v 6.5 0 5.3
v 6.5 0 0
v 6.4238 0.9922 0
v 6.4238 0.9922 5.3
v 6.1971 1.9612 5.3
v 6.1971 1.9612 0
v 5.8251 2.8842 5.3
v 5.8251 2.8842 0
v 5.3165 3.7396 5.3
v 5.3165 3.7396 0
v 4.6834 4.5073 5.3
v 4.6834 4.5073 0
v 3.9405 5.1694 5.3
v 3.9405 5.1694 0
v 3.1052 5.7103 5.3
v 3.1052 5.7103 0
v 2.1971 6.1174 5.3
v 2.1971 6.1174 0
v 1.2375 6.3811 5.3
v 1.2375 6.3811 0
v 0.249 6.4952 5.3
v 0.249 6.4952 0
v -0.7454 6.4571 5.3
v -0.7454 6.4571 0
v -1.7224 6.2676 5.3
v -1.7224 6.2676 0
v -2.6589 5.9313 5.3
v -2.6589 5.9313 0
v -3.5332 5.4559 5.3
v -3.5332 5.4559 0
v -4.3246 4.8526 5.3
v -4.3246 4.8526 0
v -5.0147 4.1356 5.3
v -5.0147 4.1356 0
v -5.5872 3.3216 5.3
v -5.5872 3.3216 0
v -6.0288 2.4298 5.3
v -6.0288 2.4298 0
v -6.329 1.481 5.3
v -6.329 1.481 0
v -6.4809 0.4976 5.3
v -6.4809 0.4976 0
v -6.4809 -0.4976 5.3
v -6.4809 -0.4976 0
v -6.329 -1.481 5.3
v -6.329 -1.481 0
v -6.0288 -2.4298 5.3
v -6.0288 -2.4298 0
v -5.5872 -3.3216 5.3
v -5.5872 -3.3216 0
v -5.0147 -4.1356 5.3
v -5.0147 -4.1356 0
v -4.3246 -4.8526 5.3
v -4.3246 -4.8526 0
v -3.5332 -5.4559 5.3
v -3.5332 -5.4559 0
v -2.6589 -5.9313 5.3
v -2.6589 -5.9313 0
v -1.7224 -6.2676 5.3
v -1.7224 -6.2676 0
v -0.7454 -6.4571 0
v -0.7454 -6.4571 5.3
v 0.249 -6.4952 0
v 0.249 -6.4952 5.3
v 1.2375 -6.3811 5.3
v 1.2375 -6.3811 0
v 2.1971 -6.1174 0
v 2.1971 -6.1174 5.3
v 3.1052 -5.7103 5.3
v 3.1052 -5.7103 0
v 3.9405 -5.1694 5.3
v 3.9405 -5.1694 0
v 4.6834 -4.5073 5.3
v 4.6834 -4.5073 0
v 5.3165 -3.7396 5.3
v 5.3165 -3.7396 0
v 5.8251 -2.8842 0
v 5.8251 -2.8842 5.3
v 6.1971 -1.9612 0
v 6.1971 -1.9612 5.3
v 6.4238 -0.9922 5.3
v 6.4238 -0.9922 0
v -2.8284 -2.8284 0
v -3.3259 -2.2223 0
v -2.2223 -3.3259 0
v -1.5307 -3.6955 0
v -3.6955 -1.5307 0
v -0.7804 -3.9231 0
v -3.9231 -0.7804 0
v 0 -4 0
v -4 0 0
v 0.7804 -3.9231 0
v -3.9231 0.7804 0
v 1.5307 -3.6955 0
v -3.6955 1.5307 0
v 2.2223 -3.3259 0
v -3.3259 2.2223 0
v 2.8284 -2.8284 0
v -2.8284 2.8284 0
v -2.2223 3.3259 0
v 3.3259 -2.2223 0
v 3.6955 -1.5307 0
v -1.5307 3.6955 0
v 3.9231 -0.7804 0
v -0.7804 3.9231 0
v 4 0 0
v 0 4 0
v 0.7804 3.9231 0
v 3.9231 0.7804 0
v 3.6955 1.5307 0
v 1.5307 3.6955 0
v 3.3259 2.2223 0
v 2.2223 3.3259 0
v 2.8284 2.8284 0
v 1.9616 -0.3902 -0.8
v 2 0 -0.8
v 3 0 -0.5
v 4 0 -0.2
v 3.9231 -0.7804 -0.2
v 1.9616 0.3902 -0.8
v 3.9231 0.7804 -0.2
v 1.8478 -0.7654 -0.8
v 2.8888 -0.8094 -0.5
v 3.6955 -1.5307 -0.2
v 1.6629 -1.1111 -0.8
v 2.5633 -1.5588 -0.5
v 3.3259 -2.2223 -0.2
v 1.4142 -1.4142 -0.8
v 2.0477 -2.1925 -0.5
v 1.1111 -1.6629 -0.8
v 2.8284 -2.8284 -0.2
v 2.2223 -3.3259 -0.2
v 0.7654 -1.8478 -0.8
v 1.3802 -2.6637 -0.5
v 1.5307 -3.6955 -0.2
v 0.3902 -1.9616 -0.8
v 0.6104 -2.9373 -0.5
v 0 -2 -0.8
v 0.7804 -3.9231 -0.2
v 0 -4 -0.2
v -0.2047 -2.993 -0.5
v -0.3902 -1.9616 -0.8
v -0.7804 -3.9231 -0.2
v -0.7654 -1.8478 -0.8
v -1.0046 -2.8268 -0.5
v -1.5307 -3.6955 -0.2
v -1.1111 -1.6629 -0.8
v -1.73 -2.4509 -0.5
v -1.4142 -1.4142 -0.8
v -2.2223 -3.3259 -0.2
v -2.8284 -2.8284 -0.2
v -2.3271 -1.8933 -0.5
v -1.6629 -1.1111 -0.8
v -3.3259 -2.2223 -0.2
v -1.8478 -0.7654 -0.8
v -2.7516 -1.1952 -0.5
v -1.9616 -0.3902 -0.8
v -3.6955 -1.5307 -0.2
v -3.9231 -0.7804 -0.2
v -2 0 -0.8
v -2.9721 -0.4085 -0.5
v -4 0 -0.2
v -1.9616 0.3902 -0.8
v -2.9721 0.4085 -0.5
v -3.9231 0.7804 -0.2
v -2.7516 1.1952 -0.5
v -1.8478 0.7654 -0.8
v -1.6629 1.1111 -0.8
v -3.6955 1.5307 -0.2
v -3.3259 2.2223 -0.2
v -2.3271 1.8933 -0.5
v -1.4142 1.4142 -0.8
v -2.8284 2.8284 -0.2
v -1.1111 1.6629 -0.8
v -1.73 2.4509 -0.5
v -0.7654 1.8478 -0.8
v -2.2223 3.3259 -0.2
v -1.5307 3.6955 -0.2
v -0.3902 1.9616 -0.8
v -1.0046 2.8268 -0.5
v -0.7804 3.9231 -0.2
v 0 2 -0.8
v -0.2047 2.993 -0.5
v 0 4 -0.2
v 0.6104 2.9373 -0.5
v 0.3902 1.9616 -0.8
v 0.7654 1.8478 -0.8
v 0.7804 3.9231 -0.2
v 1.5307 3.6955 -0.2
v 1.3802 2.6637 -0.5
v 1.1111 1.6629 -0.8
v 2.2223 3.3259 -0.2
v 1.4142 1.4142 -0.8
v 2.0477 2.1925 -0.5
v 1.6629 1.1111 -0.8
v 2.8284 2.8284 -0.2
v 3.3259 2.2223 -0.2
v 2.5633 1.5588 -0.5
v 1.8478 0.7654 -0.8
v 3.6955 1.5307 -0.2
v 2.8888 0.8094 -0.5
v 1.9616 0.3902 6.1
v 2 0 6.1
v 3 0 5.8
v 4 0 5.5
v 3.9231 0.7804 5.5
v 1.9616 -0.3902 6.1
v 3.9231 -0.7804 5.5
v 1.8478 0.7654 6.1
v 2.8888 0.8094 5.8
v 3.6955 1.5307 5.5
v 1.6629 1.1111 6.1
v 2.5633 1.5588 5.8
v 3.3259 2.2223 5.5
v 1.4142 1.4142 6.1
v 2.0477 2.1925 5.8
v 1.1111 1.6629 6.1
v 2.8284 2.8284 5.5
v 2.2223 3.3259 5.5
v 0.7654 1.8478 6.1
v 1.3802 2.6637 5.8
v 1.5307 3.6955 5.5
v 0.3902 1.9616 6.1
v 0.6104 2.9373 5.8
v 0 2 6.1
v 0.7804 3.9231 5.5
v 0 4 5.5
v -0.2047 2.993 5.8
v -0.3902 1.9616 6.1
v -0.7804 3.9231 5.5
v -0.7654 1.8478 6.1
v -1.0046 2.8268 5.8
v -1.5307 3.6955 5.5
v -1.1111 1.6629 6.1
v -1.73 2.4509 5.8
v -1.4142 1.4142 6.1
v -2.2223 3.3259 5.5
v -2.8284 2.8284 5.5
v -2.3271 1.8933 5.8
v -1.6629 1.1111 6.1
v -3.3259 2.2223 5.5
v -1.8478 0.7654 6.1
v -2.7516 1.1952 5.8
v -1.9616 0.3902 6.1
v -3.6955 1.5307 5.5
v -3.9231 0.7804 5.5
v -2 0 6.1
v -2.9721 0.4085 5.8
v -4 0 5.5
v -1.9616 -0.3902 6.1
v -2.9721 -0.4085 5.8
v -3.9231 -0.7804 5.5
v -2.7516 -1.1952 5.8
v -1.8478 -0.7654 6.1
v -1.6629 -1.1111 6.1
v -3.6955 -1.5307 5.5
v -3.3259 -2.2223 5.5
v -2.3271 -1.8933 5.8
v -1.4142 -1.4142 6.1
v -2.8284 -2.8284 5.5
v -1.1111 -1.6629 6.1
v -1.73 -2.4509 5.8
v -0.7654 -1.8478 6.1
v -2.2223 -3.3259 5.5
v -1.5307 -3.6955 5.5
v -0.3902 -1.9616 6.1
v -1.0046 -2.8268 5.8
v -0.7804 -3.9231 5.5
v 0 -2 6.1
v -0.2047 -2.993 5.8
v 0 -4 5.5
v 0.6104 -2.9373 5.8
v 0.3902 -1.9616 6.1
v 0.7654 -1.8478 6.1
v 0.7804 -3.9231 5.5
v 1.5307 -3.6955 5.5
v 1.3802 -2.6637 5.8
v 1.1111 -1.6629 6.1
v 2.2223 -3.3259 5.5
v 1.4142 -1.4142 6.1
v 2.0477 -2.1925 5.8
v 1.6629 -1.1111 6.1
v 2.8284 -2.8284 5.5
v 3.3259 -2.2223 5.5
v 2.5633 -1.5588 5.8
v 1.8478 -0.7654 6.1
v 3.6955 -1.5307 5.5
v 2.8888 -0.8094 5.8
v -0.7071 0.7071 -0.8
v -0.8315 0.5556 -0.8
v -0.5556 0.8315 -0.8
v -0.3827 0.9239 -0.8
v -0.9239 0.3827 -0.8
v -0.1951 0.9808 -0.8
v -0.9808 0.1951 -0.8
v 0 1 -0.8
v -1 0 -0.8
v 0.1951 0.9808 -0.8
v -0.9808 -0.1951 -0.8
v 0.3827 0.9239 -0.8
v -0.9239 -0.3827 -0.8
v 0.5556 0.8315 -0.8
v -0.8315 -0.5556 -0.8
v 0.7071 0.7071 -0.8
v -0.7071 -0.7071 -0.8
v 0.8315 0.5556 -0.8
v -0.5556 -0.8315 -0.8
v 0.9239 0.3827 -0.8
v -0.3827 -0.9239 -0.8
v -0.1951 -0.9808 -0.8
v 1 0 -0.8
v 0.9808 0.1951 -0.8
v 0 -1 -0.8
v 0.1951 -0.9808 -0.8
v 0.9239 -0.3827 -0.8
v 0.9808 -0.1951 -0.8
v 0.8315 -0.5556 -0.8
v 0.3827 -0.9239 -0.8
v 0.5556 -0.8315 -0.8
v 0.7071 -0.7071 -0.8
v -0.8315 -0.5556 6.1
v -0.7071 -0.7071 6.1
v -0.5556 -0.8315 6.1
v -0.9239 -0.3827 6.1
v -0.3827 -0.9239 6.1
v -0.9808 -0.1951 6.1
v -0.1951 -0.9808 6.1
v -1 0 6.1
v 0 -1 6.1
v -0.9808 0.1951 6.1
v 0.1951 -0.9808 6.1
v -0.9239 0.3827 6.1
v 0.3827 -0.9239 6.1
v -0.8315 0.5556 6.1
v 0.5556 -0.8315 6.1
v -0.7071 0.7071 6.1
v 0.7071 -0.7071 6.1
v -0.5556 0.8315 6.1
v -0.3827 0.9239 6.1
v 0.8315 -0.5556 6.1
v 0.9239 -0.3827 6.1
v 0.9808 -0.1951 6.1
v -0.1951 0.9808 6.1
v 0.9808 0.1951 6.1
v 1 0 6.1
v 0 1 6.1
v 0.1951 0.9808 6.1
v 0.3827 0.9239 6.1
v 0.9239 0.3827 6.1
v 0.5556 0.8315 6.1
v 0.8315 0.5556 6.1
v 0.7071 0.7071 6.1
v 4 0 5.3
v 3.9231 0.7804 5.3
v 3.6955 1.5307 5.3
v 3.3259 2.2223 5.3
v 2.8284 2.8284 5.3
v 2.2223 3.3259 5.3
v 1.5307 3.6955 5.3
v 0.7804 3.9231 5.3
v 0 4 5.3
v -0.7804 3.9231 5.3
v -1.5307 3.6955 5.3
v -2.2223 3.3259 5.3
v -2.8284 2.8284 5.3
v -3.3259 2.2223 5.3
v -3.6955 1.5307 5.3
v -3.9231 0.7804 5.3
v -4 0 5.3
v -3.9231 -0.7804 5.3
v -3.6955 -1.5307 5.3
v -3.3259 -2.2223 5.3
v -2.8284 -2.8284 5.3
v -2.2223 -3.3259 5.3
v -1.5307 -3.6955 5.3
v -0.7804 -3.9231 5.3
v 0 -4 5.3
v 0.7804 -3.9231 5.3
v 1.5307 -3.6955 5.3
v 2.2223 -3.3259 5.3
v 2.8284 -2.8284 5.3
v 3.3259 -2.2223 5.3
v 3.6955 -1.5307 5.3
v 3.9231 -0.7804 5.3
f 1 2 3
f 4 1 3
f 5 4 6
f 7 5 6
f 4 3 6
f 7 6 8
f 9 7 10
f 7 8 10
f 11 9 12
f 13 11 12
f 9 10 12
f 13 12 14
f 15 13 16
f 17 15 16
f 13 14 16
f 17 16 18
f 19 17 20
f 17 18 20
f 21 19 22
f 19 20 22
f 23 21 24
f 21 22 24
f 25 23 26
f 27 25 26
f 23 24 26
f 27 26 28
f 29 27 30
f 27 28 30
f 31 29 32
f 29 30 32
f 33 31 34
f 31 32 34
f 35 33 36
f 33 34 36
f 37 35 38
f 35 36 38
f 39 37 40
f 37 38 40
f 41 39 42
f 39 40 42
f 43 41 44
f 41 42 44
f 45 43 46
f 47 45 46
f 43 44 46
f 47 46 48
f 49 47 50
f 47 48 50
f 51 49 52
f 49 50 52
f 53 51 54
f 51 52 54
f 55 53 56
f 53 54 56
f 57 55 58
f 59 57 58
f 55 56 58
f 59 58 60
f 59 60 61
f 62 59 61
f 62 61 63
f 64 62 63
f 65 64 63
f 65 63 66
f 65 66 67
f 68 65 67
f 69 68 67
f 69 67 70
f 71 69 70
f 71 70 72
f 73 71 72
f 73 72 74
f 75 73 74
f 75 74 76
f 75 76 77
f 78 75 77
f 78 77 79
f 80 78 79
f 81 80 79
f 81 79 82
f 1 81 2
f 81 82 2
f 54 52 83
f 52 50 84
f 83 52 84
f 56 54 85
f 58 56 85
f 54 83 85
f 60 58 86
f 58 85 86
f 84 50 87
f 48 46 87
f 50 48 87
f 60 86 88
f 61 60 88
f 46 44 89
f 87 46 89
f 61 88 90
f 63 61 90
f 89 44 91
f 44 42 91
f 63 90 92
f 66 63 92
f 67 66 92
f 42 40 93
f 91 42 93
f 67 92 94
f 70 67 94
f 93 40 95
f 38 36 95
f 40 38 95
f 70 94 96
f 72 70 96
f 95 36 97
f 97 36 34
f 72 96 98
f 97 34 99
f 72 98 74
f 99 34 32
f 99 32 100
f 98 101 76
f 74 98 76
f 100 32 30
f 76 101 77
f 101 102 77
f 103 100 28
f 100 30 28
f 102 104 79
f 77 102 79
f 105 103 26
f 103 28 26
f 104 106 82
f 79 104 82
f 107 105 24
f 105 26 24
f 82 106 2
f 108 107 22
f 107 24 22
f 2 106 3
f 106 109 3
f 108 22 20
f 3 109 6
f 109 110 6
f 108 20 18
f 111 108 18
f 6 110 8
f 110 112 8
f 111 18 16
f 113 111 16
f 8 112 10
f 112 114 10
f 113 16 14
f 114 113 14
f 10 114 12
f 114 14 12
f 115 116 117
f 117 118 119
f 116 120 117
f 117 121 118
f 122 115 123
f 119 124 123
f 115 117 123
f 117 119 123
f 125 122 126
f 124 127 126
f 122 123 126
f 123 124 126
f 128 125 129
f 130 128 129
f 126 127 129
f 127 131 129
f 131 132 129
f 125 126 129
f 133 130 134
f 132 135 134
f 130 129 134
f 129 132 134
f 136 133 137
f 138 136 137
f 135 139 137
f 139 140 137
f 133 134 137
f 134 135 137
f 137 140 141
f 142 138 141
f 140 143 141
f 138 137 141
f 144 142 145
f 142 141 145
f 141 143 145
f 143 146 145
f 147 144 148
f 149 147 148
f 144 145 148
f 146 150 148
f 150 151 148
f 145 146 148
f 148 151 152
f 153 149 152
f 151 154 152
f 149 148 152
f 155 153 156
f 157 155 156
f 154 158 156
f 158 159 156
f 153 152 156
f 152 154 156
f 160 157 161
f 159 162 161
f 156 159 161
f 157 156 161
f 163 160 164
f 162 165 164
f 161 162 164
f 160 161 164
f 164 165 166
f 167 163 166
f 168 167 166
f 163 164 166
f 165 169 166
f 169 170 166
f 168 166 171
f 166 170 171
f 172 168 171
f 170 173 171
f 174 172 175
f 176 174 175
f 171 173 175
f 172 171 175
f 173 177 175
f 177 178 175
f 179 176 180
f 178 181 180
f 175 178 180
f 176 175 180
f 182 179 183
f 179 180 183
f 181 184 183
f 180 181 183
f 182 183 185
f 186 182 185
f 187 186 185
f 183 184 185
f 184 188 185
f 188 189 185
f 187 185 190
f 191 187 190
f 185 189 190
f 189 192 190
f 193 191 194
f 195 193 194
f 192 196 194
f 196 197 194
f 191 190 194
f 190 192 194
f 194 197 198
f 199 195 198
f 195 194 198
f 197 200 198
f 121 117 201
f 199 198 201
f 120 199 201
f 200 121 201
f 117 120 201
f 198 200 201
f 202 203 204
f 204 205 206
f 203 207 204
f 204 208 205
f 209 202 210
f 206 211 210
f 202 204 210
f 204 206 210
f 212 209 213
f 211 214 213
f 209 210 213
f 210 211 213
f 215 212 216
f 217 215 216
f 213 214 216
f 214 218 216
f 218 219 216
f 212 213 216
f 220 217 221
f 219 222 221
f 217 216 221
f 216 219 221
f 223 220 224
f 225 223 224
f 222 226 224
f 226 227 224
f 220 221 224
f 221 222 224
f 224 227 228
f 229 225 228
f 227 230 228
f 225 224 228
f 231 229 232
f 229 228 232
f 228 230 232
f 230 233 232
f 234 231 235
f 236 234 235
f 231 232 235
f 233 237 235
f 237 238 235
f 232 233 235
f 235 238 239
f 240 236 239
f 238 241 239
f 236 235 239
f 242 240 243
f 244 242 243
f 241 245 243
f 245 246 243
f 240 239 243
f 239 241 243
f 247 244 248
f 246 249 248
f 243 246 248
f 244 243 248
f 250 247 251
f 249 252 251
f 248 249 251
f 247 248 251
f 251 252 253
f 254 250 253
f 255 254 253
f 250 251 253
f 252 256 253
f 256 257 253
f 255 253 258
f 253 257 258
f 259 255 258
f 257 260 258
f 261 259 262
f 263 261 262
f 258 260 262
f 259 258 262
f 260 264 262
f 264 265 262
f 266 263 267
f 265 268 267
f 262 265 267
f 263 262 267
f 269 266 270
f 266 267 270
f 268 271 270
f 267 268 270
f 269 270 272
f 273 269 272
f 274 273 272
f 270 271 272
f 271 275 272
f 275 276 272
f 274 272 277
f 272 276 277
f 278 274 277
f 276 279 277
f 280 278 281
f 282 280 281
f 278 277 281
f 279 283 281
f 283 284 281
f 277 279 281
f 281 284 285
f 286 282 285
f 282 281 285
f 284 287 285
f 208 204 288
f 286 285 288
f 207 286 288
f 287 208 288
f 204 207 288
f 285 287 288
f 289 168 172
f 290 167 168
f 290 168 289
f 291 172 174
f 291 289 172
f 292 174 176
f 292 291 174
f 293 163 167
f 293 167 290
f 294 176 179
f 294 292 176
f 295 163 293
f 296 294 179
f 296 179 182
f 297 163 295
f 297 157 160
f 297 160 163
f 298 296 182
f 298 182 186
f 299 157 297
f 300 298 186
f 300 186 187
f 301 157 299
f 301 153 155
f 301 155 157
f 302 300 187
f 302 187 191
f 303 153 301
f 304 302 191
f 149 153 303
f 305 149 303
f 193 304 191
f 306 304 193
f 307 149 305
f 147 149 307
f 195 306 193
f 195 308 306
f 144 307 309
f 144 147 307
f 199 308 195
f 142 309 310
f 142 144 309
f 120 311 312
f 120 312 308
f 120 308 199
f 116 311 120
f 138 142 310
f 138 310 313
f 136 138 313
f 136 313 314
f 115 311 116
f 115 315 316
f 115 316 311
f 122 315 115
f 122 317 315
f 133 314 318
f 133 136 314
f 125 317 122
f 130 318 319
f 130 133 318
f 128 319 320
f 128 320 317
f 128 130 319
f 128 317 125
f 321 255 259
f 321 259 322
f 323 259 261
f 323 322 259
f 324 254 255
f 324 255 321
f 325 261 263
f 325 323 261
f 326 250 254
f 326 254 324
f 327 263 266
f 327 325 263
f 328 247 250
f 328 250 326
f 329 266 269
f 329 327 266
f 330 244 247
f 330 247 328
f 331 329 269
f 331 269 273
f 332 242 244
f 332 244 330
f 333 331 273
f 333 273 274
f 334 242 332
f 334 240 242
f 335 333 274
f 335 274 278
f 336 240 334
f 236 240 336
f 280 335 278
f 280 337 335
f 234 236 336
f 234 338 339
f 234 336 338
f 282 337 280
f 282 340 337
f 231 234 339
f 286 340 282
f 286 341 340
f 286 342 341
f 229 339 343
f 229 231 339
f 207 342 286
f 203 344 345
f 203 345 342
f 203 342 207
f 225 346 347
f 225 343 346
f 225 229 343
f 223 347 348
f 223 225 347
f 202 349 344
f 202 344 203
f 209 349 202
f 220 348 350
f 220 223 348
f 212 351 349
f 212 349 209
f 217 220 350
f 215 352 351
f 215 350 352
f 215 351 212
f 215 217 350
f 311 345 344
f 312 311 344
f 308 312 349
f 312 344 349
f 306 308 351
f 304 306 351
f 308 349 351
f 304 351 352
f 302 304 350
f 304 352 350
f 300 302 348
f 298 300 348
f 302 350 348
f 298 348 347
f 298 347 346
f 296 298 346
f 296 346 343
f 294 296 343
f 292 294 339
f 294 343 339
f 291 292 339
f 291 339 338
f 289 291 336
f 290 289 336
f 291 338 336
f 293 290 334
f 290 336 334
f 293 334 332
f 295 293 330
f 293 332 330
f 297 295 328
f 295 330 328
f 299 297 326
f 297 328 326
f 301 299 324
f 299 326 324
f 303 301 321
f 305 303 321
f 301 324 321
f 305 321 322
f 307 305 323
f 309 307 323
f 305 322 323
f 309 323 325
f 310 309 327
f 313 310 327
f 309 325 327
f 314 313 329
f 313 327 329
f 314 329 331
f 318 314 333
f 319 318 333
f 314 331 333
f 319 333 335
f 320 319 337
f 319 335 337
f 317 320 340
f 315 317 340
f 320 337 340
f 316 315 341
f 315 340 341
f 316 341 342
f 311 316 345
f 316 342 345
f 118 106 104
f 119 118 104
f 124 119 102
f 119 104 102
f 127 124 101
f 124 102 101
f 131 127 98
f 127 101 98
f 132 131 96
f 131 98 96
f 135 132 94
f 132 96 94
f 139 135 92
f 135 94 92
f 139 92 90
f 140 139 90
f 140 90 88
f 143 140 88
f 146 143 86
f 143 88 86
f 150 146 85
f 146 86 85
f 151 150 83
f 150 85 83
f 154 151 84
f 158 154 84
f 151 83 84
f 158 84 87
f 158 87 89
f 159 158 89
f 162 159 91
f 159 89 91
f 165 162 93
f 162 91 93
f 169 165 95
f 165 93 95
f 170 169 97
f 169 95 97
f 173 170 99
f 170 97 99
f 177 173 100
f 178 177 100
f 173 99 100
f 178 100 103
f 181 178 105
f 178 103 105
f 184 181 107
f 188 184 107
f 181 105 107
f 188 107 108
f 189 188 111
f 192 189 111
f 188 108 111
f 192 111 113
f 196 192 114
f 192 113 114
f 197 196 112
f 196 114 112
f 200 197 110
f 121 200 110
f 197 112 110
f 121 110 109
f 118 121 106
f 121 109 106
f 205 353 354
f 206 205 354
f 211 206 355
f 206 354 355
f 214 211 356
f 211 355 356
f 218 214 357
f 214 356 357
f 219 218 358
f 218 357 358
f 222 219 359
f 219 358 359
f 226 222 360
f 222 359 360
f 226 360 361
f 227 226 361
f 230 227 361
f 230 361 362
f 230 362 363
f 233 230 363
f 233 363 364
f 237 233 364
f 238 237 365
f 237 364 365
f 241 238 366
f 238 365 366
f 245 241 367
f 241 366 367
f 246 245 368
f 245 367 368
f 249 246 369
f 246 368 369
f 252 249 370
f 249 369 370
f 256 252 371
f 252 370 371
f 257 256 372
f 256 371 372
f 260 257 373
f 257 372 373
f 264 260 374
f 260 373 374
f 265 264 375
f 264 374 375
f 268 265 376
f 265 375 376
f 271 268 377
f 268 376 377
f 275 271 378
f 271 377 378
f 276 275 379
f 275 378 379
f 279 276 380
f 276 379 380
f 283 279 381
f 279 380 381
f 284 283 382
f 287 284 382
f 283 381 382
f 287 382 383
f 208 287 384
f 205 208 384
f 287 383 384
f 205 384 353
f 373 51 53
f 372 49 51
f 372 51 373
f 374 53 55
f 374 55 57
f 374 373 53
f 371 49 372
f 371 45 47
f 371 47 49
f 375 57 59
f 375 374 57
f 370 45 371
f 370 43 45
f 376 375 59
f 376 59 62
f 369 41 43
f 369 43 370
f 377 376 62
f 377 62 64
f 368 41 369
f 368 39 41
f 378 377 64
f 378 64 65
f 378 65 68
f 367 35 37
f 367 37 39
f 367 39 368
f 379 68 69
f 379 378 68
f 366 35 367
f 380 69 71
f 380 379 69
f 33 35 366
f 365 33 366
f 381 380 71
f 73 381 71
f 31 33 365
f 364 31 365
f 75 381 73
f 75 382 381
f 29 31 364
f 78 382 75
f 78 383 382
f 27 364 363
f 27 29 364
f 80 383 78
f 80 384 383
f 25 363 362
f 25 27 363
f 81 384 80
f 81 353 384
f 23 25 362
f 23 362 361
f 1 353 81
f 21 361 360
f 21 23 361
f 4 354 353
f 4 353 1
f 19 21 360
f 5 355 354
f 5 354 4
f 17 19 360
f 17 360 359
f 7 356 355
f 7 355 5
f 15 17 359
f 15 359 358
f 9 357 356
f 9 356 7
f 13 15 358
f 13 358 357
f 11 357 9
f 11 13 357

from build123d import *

# Parameters (mm, degrees)
F0_R       = 6.5
F1_DEPTH   = 5.3
F2_R       = 4
F3_DEPTH   = 0.8
F4_R       = 4
F5_DEPTH   = 0.8
F6_SIZE2   = 0.6
F6_SIZE    = 2
F6_2_SIZE2 = 0.6
F6_2_SIZE  = 2
F7_R       = 1
F8_DEPTH   = 6.9


with BuildPart() as f1:
    # F0 (on Top) → F1 (new body)
    with BuildSketch(Plane.XY):
        Circle(F0_R)
    extrude(amount=F1_DEPTH)

    # F2 (on face) → F3 (join)
    with BuildSketch(Plane.XY.offset(5.3)):
        Circle(F2_R)
    extrude(amount=F3_DEPTH)

    # F4 (on face) → F5 (join)
    with BuildSketch(Plane(origin=(0, 0, 0), x_dir=(1, 0, 0), z_dir=(0, 0, -1))):
        Circle(F4_R)
    extrude(amount=F5_DEPTH)

    # F6
    f6_edges = [f1.edges().sort_by_distance(p)[0] for p in [
        (-4, 0, -0.8),
    ]]
    f6_side = f1.faces().sort_by_distance((0, 0, -0.8))[0]
    chamfer(f6_edges, length=F6_SIZE, length2=F6_SIZE2, reference=f6_side)

    # F6#2
    f6_2_edges = [f1.edges().sort_by_distance(p)[0] for p in [
        (-4, 0, 6.1),
    ]]
    f6_2_side = f1.faces().sort_by_distance((0, 0, 6.1))[0]
    chamfer(f6_2_edges, length=F6_2_SIZE, length2=F6_2_SIZE2, reference=f6_2_side)

    # F7 (on face) → F8 (cut, through all)
    with BuildSketch(Plane.XY.offset(6.1)):
        Circle(F7_R)
    extrude(amount=-F8_DEPTH, mode=Mode.SUBTRACT)


solid = f1.part
